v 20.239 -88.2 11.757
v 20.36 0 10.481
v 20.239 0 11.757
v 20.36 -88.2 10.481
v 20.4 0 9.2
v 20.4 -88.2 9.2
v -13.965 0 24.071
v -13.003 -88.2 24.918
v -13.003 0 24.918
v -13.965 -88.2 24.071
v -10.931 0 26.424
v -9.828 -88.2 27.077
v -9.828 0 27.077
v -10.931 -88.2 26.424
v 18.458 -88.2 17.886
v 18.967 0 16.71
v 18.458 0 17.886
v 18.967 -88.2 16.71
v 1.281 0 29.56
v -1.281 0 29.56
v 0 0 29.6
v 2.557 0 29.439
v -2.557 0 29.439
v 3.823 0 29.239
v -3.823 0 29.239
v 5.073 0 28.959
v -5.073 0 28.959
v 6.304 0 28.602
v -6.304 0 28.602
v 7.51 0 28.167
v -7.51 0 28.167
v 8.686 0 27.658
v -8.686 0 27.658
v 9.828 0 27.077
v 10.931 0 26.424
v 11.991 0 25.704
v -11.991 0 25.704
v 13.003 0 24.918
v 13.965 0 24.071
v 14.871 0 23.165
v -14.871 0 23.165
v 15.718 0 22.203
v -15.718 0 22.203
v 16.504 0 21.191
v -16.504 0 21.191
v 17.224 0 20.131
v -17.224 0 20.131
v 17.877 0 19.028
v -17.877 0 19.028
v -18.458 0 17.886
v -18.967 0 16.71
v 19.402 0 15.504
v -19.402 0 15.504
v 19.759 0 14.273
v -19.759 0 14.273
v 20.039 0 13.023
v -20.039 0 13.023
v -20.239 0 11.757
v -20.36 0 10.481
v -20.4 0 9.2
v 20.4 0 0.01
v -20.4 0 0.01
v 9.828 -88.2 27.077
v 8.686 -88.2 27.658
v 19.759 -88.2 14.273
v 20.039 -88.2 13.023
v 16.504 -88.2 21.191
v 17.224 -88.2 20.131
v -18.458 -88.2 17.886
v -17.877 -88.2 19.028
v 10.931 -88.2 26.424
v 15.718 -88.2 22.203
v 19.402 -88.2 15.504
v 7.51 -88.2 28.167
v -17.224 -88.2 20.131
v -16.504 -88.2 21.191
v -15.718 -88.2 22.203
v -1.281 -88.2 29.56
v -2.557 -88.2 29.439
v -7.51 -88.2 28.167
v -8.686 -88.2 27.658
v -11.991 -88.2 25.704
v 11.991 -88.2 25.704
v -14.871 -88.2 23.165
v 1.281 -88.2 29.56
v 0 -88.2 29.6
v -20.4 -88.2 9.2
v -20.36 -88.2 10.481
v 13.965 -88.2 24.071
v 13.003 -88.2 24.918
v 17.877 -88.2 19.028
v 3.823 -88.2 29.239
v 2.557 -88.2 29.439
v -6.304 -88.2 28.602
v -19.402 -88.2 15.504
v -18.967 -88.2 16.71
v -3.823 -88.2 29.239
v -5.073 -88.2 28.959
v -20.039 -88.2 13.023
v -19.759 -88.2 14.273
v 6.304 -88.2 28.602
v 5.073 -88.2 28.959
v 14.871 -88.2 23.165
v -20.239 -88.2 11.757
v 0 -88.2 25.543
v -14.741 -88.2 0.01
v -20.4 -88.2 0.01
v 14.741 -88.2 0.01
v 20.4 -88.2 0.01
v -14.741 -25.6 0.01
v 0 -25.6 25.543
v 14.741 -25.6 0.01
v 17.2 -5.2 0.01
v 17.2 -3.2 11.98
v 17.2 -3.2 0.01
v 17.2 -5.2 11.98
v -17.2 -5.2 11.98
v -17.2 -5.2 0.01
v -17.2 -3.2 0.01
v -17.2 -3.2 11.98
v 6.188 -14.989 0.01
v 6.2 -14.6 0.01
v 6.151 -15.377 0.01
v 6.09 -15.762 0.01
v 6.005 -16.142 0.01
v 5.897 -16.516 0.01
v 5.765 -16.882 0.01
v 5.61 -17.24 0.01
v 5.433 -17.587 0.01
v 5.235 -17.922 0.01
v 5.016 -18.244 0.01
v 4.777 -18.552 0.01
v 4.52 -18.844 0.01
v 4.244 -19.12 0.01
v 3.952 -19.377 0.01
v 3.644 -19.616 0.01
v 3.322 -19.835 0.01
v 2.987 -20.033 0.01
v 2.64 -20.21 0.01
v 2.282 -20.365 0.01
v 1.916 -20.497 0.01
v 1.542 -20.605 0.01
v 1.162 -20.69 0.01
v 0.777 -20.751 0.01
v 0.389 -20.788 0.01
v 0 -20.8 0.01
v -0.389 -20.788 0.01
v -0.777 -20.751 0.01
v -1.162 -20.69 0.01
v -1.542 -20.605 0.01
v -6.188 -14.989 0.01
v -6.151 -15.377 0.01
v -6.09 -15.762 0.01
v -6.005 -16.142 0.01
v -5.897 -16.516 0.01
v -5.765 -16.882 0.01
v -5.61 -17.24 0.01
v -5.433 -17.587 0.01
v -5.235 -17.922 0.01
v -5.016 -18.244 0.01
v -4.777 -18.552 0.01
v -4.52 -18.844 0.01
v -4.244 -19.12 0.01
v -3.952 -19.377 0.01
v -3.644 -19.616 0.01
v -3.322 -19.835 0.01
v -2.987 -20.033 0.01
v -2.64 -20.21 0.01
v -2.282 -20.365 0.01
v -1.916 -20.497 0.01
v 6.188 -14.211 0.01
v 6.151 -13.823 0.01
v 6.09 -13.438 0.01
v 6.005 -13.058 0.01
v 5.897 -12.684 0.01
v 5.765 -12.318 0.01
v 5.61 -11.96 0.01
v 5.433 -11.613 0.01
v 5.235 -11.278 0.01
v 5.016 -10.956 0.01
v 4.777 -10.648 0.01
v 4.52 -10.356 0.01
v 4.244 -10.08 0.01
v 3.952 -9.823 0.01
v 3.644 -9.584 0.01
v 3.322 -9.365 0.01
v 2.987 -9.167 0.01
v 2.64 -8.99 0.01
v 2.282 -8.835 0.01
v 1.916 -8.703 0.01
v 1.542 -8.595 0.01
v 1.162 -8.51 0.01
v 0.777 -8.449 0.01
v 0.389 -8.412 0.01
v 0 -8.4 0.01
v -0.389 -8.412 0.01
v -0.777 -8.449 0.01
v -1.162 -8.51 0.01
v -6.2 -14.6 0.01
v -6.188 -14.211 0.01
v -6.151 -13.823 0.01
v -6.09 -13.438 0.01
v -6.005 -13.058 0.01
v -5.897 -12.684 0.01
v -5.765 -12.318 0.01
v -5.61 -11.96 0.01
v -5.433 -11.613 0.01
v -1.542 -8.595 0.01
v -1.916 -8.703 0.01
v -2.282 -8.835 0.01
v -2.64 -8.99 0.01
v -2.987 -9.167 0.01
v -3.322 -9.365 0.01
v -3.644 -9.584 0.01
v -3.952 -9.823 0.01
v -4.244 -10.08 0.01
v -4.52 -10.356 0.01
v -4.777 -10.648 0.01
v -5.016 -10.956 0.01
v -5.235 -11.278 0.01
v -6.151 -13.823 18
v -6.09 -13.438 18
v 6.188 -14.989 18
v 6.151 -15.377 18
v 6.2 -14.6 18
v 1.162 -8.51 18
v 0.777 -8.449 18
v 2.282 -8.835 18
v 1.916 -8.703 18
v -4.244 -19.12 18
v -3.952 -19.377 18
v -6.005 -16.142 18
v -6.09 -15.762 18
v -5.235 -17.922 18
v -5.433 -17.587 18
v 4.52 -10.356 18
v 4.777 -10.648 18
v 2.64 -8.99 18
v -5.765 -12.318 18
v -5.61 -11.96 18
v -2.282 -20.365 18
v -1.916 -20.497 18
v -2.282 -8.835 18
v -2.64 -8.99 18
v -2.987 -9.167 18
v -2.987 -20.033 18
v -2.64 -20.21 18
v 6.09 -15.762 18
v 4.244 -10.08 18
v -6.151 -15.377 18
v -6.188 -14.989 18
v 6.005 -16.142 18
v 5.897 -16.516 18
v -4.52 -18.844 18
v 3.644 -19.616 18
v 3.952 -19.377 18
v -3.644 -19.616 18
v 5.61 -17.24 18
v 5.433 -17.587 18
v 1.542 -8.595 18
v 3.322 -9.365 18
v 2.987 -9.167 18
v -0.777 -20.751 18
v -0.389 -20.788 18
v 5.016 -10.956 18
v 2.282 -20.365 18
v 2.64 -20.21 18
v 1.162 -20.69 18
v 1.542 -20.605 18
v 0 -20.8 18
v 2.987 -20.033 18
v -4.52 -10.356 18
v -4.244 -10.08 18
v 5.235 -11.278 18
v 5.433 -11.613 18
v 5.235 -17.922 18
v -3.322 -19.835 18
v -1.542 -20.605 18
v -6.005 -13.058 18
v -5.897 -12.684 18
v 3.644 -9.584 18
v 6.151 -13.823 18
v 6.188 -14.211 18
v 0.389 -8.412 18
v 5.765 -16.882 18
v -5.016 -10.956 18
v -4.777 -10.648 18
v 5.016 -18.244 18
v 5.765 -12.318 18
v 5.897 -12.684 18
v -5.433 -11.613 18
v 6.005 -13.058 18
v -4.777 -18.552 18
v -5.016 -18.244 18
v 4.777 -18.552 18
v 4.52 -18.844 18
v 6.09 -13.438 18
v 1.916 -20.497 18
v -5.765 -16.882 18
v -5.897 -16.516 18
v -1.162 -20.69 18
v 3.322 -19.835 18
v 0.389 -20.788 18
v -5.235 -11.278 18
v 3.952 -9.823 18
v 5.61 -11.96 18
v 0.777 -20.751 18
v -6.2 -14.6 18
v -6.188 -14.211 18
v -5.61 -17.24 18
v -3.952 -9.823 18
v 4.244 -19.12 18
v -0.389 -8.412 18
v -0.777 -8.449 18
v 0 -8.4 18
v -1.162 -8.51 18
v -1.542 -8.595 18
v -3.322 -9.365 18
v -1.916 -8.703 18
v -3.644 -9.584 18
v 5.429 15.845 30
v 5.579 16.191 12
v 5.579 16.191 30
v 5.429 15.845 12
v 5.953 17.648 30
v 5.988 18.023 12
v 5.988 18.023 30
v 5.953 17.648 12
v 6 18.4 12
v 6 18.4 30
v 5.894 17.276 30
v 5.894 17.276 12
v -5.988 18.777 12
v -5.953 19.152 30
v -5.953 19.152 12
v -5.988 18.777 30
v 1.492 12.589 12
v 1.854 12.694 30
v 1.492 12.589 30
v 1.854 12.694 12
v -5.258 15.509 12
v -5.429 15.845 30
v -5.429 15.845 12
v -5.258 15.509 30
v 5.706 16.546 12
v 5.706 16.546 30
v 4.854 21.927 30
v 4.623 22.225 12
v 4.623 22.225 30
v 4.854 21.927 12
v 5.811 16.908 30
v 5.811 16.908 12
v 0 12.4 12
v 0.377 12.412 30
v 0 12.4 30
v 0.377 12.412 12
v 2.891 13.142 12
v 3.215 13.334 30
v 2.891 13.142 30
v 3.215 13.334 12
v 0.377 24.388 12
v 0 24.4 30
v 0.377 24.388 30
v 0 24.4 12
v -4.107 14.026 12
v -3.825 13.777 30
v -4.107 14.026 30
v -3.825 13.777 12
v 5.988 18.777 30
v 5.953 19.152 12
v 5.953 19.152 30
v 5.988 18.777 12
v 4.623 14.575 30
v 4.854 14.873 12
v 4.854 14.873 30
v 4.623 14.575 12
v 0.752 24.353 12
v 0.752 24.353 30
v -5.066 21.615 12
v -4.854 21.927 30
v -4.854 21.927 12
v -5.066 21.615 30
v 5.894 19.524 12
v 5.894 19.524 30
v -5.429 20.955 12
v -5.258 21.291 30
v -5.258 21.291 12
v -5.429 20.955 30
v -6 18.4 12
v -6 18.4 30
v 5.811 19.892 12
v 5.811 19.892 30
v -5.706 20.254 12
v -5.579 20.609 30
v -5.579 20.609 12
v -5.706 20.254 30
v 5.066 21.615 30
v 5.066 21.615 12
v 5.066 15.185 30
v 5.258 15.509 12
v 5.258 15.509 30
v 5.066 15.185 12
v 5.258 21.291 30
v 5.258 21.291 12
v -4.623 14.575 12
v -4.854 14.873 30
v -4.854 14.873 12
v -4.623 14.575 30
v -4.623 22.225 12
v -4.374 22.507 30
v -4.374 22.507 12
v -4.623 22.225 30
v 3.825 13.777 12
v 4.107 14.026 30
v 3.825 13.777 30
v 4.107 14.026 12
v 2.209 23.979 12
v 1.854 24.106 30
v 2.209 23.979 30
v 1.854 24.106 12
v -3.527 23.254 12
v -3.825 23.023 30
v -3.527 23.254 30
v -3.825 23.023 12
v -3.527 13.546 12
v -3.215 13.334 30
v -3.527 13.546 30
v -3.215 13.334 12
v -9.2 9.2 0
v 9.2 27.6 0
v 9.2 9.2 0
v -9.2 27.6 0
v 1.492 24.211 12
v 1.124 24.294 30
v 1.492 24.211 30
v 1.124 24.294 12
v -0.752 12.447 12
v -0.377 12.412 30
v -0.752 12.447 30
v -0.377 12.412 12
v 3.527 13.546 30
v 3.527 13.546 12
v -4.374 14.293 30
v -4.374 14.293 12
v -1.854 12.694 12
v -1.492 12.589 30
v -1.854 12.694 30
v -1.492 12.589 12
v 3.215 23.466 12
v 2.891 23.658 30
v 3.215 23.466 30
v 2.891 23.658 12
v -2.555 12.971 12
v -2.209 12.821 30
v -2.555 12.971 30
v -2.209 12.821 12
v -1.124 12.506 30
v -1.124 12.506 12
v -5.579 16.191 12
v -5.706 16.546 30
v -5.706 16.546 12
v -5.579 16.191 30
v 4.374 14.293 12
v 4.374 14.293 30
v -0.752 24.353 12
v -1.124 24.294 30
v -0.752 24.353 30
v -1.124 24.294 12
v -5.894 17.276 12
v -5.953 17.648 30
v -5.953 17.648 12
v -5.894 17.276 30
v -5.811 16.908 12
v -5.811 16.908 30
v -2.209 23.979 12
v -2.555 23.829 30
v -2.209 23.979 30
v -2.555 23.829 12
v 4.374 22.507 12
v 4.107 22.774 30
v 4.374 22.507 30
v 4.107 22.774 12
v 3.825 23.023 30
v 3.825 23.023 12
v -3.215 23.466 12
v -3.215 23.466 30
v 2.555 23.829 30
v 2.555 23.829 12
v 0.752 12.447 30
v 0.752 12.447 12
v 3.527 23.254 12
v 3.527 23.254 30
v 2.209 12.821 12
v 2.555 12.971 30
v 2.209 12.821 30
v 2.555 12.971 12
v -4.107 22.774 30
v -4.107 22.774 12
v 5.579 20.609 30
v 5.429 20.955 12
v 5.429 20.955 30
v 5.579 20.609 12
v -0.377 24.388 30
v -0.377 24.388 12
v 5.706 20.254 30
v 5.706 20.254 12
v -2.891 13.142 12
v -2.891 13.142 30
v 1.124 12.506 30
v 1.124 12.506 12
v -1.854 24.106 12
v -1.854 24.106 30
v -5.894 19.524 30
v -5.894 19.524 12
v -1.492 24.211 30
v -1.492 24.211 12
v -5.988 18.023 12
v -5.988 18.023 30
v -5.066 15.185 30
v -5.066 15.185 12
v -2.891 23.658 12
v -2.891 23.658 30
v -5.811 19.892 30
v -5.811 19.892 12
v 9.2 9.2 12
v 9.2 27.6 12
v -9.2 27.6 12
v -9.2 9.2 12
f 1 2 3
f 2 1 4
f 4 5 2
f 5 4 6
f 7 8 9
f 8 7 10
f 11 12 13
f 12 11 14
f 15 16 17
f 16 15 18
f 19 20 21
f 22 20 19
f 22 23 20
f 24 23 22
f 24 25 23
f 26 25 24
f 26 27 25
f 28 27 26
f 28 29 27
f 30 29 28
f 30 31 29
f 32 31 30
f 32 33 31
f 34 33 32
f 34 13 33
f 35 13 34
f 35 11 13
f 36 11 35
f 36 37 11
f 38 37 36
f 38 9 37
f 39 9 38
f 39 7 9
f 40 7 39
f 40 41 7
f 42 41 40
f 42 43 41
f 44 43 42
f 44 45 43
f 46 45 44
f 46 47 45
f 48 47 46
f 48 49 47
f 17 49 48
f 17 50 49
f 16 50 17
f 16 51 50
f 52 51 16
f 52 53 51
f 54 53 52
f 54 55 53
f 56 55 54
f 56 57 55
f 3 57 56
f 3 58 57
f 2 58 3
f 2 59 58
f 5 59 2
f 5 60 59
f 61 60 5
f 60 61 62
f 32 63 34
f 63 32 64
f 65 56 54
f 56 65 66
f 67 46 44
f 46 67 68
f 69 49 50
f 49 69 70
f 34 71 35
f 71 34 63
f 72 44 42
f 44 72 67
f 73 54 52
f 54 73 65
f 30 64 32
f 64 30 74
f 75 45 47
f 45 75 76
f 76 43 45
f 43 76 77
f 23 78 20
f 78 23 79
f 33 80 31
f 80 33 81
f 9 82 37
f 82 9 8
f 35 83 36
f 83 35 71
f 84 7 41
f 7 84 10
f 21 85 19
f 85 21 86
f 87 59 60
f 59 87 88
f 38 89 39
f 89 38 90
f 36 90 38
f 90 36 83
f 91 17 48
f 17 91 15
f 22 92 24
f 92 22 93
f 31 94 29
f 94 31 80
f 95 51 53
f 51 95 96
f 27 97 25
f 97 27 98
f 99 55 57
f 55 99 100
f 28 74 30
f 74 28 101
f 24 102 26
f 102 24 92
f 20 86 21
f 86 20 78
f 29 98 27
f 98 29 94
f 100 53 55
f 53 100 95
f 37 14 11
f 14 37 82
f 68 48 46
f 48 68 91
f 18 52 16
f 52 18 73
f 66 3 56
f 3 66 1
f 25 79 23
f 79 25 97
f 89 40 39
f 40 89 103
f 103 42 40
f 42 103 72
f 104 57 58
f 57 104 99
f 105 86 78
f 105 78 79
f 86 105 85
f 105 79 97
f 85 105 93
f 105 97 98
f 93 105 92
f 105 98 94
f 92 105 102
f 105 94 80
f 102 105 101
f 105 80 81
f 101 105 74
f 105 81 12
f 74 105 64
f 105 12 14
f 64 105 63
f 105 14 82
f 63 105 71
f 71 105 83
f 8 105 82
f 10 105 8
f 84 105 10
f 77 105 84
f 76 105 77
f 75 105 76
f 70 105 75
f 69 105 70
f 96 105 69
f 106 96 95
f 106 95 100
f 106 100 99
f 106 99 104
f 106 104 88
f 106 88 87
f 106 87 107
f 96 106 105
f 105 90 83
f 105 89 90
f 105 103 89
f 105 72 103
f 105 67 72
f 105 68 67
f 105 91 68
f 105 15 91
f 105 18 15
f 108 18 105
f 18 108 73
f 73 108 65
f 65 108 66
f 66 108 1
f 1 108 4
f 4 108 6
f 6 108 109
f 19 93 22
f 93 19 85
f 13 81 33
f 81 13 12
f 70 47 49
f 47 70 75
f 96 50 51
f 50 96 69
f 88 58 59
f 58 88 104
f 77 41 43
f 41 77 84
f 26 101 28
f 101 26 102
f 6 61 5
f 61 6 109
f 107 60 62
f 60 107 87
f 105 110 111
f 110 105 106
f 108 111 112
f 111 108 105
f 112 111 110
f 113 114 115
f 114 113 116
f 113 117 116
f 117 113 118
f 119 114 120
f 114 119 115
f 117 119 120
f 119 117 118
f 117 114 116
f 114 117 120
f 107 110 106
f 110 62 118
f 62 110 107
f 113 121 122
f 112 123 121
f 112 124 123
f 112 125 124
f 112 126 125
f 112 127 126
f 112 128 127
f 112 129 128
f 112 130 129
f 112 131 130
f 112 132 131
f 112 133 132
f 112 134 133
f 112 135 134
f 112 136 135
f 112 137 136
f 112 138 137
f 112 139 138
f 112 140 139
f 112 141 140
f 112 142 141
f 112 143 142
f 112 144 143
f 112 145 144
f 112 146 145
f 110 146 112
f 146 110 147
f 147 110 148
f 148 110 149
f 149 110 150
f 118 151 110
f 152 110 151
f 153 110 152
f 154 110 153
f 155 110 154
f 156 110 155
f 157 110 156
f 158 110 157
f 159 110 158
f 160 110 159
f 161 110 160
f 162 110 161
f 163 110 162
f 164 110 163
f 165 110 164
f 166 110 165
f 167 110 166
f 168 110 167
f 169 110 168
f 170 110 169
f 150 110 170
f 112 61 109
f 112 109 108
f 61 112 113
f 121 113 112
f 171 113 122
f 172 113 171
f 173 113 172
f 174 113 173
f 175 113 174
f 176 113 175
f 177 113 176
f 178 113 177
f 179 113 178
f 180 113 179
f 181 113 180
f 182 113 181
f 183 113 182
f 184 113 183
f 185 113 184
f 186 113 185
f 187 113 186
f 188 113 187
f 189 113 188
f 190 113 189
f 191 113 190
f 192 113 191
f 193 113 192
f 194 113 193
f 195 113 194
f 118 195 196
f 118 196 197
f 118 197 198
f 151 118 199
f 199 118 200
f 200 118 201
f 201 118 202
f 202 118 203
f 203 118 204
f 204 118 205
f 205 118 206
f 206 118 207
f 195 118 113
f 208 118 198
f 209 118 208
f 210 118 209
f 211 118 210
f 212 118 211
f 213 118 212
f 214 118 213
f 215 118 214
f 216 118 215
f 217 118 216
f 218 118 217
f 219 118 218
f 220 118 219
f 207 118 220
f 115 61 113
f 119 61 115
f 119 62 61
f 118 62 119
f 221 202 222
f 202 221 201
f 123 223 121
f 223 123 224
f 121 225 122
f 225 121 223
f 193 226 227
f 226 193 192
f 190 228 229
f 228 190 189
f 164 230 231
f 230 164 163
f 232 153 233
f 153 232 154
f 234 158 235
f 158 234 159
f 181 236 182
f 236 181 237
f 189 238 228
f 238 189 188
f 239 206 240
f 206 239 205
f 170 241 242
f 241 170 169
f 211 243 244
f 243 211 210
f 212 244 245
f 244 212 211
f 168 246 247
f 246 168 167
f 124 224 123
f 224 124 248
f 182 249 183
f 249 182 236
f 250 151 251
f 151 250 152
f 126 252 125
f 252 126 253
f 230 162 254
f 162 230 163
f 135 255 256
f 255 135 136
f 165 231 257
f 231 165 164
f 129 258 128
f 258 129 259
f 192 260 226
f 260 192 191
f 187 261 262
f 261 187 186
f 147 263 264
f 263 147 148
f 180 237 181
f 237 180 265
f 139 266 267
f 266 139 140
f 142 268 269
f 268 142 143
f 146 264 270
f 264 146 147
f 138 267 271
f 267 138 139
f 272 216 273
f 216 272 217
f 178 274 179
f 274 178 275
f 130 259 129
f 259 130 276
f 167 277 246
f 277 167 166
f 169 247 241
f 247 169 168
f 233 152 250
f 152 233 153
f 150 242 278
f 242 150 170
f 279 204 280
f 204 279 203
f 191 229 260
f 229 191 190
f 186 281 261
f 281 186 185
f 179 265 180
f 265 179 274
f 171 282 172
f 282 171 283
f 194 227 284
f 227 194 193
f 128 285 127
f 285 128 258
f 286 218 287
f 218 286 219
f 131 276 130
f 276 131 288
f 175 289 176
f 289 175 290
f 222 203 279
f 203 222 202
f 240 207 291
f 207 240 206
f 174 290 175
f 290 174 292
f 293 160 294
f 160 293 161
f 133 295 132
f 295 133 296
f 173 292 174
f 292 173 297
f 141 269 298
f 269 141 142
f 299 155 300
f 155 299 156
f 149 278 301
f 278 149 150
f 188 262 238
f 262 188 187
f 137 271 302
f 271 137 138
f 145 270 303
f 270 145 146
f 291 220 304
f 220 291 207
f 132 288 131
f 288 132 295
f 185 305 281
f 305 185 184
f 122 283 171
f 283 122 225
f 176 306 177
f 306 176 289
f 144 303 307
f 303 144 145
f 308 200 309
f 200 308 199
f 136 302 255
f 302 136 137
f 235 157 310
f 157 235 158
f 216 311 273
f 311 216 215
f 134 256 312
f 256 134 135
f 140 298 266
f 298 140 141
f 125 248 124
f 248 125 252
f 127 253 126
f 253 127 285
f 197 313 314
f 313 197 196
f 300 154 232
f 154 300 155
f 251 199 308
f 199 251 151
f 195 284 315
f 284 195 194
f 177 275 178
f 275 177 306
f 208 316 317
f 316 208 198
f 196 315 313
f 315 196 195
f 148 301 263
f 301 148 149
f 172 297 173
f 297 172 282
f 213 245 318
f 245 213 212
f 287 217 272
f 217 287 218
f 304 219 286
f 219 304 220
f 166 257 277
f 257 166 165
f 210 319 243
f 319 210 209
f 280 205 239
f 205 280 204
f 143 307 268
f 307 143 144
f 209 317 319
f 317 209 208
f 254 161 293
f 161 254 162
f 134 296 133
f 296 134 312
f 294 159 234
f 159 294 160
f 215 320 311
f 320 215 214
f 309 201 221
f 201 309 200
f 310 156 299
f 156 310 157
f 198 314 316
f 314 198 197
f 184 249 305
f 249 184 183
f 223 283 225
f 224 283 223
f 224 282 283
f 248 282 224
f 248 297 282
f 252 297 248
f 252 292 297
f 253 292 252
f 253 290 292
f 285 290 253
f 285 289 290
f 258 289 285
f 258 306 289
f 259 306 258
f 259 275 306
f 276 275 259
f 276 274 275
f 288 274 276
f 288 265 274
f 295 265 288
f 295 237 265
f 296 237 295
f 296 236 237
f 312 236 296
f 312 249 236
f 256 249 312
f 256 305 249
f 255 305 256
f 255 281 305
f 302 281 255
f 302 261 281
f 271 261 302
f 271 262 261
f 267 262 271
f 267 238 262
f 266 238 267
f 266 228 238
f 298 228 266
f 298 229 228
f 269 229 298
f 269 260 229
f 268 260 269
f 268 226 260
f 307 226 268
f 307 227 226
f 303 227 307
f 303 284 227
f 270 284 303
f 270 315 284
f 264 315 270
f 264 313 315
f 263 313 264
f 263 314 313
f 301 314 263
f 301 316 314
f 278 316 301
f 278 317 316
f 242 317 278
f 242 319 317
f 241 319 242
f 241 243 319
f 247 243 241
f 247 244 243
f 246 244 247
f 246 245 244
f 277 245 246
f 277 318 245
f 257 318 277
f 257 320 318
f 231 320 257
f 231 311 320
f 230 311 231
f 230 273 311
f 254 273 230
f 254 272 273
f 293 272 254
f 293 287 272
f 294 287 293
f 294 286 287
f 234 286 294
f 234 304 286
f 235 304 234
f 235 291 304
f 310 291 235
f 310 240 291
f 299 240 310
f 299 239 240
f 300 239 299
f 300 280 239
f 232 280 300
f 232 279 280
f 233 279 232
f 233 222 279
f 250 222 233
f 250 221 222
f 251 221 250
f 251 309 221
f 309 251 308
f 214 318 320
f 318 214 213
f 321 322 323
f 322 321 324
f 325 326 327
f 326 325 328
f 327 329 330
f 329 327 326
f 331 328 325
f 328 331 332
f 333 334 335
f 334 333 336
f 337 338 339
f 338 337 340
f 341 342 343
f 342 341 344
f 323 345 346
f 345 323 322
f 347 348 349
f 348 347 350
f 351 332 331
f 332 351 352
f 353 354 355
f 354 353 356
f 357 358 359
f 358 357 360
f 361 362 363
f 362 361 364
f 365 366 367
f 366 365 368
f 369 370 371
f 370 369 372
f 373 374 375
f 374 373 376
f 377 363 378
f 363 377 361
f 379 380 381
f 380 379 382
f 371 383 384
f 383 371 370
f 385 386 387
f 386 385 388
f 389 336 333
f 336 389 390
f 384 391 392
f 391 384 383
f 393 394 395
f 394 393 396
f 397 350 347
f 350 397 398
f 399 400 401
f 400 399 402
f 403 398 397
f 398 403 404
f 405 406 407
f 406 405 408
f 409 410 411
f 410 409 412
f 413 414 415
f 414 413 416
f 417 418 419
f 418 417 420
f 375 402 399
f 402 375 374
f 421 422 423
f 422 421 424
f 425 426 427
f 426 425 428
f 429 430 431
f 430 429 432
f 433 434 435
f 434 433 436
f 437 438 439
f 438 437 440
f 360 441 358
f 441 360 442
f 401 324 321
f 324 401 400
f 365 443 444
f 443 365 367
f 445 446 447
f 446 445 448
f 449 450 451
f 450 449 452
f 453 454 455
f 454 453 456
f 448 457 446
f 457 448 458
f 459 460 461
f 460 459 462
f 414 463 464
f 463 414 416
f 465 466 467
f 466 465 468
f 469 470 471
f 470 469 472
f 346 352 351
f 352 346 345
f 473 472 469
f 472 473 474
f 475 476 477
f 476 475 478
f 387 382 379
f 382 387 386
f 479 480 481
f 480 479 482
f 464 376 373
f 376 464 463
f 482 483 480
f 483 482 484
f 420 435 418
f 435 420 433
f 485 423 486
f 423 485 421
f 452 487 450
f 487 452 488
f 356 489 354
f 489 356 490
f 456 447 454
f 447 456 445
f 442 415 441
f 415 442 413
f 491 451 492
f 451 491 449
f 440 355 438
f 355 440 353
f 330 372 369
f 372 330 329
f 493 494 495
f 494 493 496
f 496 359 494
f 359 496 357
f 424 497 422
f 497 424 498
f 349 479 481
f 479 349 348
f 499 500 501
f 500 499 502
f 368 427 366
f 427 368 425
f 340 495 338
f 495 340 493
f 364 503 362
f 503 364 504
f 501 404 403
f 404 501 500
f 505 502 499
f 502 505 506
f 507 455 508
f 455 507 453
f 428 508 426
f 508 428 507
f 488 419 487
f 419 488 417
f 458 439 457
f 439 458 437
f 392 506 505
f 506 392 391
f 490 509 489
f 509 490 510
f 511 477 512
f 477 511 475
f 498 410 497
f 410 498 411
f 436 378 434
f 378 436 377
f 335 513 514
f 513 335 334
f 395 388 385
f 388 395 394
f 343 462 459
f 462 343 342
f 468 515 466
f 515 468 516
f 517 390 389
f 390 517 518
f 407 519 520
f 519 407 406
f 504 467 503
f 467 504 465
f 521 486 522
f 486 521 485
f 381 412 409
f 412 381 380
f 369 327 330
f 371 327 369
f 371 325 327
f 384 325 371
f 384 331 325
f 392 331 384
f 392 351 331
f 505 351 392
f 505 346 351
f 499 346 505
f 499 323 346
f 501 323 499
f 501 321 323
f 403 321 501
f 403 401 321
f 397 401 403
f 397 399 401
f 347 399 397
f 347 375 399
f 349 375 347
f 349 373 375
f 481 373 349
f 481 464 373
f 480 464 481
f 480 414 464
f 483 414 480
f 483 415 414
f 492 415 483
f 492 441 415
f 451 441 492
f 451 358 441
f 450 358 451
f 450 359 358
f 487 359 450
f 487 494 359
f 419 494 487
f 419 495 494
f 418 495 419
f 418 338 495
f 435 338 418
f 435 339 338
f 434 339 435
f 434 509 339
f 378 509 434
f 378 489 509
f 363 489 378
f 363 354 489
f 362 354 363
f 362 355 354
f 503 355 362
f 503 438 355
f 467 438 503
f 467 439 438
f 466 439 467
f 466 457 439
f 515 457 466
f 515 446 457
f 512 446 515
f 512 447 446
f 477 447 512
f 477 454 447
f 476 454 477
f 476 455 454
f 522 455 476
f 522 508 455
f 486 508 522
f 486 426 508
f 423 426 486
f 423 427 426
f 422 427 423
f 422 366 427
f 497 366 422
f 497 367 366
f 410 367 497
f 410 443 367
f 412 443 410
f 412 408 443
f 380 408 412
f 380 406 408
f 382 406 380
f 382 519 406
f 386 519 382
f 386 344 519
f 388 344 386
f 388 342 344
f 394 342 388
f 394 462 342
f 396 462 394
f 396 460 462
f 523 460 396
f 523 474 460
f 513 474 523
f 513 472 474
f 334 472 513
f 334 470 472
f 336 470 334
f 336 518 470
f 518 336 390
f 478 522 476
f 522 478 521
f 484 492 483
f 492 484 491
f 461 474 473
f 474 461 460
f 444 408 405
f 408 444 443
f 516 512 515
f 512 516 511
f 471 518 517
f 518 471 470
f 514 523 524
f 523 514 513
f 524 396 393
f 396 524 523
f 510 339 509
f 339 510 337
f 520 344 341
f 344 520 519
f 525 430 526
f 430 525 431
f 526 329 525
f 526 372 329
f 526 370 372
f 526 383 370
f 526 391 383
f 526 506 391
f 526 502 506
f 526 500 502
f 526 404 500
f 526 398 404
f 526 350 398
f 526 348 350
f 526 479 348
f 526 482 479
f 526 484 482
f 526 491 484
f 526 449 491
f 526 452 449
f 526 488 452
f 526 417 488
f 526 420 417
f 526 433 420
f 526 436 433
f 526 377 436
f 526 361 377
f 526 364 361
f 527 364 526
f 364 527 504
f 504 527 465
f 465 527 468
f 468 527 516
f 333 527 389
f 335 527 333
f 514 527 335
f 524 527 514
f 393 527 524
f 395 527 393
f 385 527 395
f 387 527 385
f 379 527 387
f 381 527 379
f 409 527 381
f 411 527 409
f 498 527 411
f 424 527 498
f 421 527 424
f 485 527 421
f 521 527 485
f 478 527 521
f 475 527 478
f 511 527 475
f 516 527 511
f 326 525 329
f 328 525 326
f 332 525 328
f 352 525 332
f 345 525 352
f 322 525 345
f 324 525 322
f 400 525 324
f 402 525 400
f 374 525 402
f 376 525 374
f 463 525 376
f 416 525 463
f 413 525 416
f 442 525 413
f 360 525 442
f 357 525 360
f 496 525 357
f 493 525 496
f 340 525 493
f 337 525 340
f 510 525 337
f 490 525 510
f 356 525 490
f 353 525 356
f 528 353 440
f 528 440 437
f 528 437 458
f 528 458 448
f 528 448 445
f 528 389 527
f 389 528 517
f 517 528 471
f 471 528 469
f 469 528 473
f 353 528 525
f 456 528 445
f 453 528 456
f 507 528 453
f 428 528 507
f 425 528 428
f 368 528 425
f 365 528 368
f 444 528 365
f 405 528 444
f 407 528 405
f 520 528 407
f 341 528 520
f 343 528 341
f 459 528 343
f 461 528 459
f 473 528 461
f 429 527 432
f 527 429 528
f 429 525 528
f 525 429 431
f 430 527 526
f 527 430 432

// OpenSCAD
$fn = 100;
epsilon = 0.01;
nozzle_d = 0.4;

rotate([90,0,0])
filament_arm();

module filament_arm(){
    // main parameters
    wt = 3.2; // wall thickness
    arm_l = 85;
    arm_d = 34.4;
    arm_h = 12;
    main_arm_th = 2;

    // derived parameters
    arm_hull_l = arm_l + wt;
    arm_hull_d = arm_d + 2*wt;
    arm_hull_h = arm_h + 2*wt;
    bolt_d = 12;
    bolt_h = 30;
    bolt_head_h = 12;
    bolt_head_d = bolt_d + 2*wt;

    difference(){
        union() {
            translate([0, arm_hull_h/2, 0]) cylinder(d=arm_hull_d, h=arm_hull_l);
            translate([0, arm_hull_h/4, arm_hull_l/2]) cube([arm_hull_d, arm_hull_h/2, arm_hull_l], center=true);
        }

        // cut out
        translate([0, (arm_h + arm_d/2)/3.5, 8*wt])
        rotate([0,0,-30])
        cylinder($fn=3, h=arm_l, d=arm_d);

        // main arm hinge
        translate([0, arm_h*0.5 - 2*epsilon, wt + main_arm_th/2]) cube([arm_d, arm_h, main_arm_th], center=true);

        // flat plane
        color("green")
        translate([0, -50+epsilon, 50]) cube([100,100,200], center=true);

        // stabelization hole
        translate([0, bolt_h/2 - bolt_head_h, 2*wt + main_arm_th + (bolt_d+nozzle_d)*0.5])
        rotate([90,0,0])
        cylinder(d=bolt_d+nozzle_d, h=bolt_h, center=true);
    }

    // #translate([0, bolt_h/2 - bolt_head_h, 2*wt + main_arm_th + (bolt_d+nozzle_d)*0.5])
    translate([0, bolt_h/2, -bolt_head_d])
    rotate([90,0,0])
    union() {
        // rotate([90,0,0])
        cylinder(d=bolt_d, h=bolt_h, center=true);

        translate([0,0,(bolt_h-bolt_head_h)/2])
        cube([bolt_head_d, bolt_head_d, bolt_head_h], center=true);
    }
}
